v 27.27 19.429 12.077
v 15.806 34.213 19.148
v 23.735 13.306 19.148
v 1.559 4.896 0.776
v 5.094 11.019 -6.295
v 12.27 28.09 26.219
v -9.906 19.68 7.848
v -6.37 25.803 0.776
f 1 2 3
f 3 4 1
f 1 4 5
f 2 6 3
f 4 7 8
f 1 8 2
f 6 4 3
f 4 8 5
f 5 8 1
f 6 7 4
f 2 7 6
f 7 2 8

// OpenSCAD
/** Expands or shrinks value to required amount of dimensions. Can be used to convert:
    
    1. scalar to vector of dimension `nd` (v must be scalar, e.g. non-list)
    2. vector to `nd` dimension - useful for converting 2d to 3d point, or vice-versa
    3. points in vector `v` to `nd` dimensions - useful for polygon processing (to convert 3d points to 2d or vice versa)
        
    - `v` value to convert (scalar, list of scalars, or list of points - list of lists (in terms of openscad))
    - `nd` can be a number of dimensions or list with default values for additional dimensions, it length specifies target count of dimensions
    
*/
function bl_nd(v, nd) = let(
    count = is_list(nd) ? len(nd) : nd
) is_list(v) ? let(
    default = is_list(nd) ? nd : bl_nd(0, count)
) is_list(v[0])
    ? [ for (p = v) bl_nd(p, default) ]
    : [ for (i = [0 : count-1]) i < len(v) ? v[i] : default[i] ]
: [ for (i = [0 : count-1]) v ];

function bl_repeat(v, n) = [ for (i = [0:n-1]) v ];

function bl_2d(v) = bl_nd(v,2);
function bl_3d(v) = bl_nd(v,3);


/** Returns property value from list of pairs where left is a string key and right is value */
function bl_get(props, key, optional = false) = let(v = search([key], props)) is_num(v[0]) ? props[v[0]][1] : assert(optional, concat("No property found by key ", key)) undef;


function bl_set_default(props, key, value) = let(v = search([key], props)) is_num(v[0]) ? props : is_list(props) ? concat(props, [key, value]) : [[key,value]];

/** Returns first parameter if not undef, otherwise returns second paramater */
function bl_def(v, v_def) = v != undef ? v : v_def;

/** Multiplies vectors elementwise (hadamard product) */
function bl_mul(a, b) = is_list(a) 
    ? is_list(b) ? [ for (i = [0:max(len(a),len(b))-1]) bl_def(a[i], 1) * bl_def(b[i], 1) ] : [ for (v = a) v * b ] 
    : is_list(b) ? [ for (v = b) v * a ] : a * b;


/** Computes factorial */
function bl_fac(n) = n <= 1 ? 1 : n * bl_fac(n - 1);

/** Computes sum of all elements in array */
function bl_sum(a, i = 0) = i >= len(a) ? 0 : a[i] + bl_sum(a, i + 1);

/** Checks whether each element of v is zero or not (zero vector with zero norm) */
function bl_zero(v, i = 0) = i >= len(v) ? true: v[i] == 0 && bl_zero(v, i + 1);

/** Computes squares vector norm */
function bl_norm_sq(v) = bl_sum([ for (e = v) e * e ]);

/** Computes unit vector */
function bl_unit(v) = v / norm(v);

function bl_unit_identity(v, i) = bl_zero(v) ? [ for (j = [0:len(v)-1]) j == i ? 1 : 0 ] : bl_unit(v);

/** Extracts elements from `l` to `r`, not including `r` */
function bl_sub(a, l, r = undef) = let (
    ol = max(0, l < 0 ? len(a) + l : l), 
    or = max(ol, min(len(a), r == undef ? len(a) : r < 0 ? len(a) + r : r))
) [ for (i = [ol: or - 1]) a[i] ];

/** Takes first `l` elements from `a` */
function bl_head(a,l) = bl_sub(a, 0, l);

/** Takes last `l` elements from `a` */
function bl_tail(a, l) = bl_sub(a, -l);

/** Takes first `l` elements from `a` then from `b` */
function bl_head_def(a,b,l) = let(k = min(l,len(a))) concat([for(i=[0:k-1]) a[i]], [for(i=[k:l-1]) b[i]]);

/** Reverses array */
function bl_reverse(a, do_reverse = true) = do_reverse ? [for (i = [len(a) - 1 : -1 : 0]) a[i]] : a;

/** Creates offsets array from matrix (or any 2 dim array) */
function bl_off(m, i = 0, sum = 0) = i > len(m) ? [] : concat([sum], bl_off(m, i + 1, sum + len(m[i])));

/** Flatten matrix to array */
function bl_flat(m) = [ for (k = m) for (n = k) n ];

/** Creates translation matrix */
function bl_move(vec, dims = 3) = let(a = bl_nd(vec, dims), l = len(vec)) [ for (i = [0:l]) [ for (j = [0:l]) i == j ? 1 : j == l ? vec[i] : 0 ] ];

/** Creates scale matrix. If vec is scalar - then creates uniform scale matrix */
function bl_scale(vec, dims = 3) = let(a = bl_nd(vec, dims), l = len(a)) [ for (i = [0:l]) [ for (j = [0:l]) i == j ? i == l ? 1 : a[i] : 0 ] ];

/** Creates 2d rotation matrix */
function bl_rot_2(angle) = [[cos(angle),-sin(angle),0],[sin(angle),cos(angle),0],[0,0,1]];

/** Creates rotation matrix around X axis */
function bl_rot_x(angle) = [[1,0,0,0],[0,cos(angle),-sin(angle),0],[0,sin(angle),cos(angle),0],[0,0,0,1]];

/** Creates rotation matrix around Y axis */
function bl_rot_y(angle) = [[cos(angle),0,sin(angle),0],[0,1,0,0],[-sin(angle),0,cos(angle),0],[0,0,0,1]];

/** Creates rotation matrix around Z axis */
function bl_rot_z(angle) = [[cos(angle),-sin(angle),0,0],[sin(angle),cos(angle),0,0],[0,0,1,0],[0,0,0,1]];

function bl_rot(xyz) = bl_rot_z(xyz[2]) * bl_rot_y(xyz[1]) * bl_rot_x(xyz[0]);

/** Creates axis-angle rotation matrix */
function bl_rot_a(axis, angle) = let(n = bl_unit(axis), s = sin(angle), c = cos(angle), ac = 1 - c) [
    [c + ac*n[0]*n[0], ac*n[0]*n[1] - s*n[2], ac*n[0]*n[2] + s*n[1], 0],
    [ac*n[1]*n[0] + s*n[2], c + ac*n[1]*n[1], ac*n[1]*n[2] - s*n[0], 0],
    [ac*n[2]*n[0] - s*n[1], ac*n[2]*n[1] + s*n[0], c + ac*n[2]*n[2], 0],
    [0,0,0,1]
];

/** Creates rotation matrix from quaternion */
function bl_rot_q(q) = let(x = q[1], y = q[2], z = q[3], w = q[0], xw = 2*x*w, yw = 2*y*w, zw = 2*z*w) [
    [1-2*y*y-2*z*z, 2*x*y - zw, 2*x*z + yw, 0],
    [2*x*y+zw, 1-2*x*x-2*z*z, 2*y*z - xw, 0],
    [2*x*z-yw, 2*y*z+xw, 1-2*x*x-2*y*y, 0],
    [0,0,0,1]
];

function bl_ort(v) = [-v[1],v[2],-v[0]];

/** Creates rotation matrix from plane normal */
function bl_rot_v(v) = let(
    up = [0,0,1],
    f = bl_unit(v),
    s = bl_unit_identity(cross(f, up), 0),
    u = bl_unit_identity(cross(s, f), 1)
)
    [
        [s[0],u[0],f[0],0],
        [s[1],u[1],f[1],0],
        [s[2],u[2],f[2],0],
        [0,0,0,1]
    ];

/** Creates identity matrix */
function bl_id(dim = 3) = [ for (i = [0:dim]) [ for (j = [0:dim]) i == j ? 1 : 0 ] ];

/** 
    Normalizes radius[]/diameter[] values to [x_radius, y_radius] array
 */
function bl_radius_cast(radius) = is_list(radius) ? len(radius) >= 2 ? radius : [radius[0], radius[0]] : [radius, radius];

/** 
    Normalizes [start, end] angle array, 
    if `a` is scalar or single element array then angles is [0, a], 
    otherwise first two elements are [start, end] angles
 */
function bl_angle_cast(angle) = is_list(angle) ? len(angle) >= 2 ? angle : [0, angle[0]] : [0, angle];

/** Approximation of ellipse perimeter (about 5% error) */
function bl_ellipse_perimeter(radius) = let(ra = bl_radius_cast(radius)) 
    2 * PI * ((ra[0] == ra[1]) ? ra[0] : sqrt((ra[0]*ra[0] + ra[1]*ra[1]) / 2));

/** 
    
    Computes number of points to draw arc. 
    Uses original OpenSCAD formula, but expands it to support ellipse arcs:
    
        int get_fragments_from_r(double r, double fn, double fs, double fa)
        {
             if (r < GRID_FINE) return 3;
             if (fn > 0.0) return (int)(fn >= 3 ? fn : 3);
             return (int)ceil(fmax(fmin(360.0 / fa, r*2*M_PI / fs), 5));
        }
    
 */
function bl_arc_steps(radius, angle) = let(aa = bl_angle_cast(angle)) $fn > 0 ? $fn : ceil(max(min(abs(aa[1] - aa[0]) / $fa, bl_ellipse_perimeter(radius) / $fs), 5));

/** Computes single arc point at given angle `a` */
function bl_arc_pt(radius, angle, position = [0,0]) = let(ra = bl_radius_cast(radius)) [cos(angle) * ra[0] + position[0], sin(angle) * ra[1] + position[1]];

/** Computes arc points using fixed amount of steps */
function bl_arc_loop(radius, angle, steps, position = [0,0], slice = [0,0]) =
    let(ra = bl_radius_cast(radius), aa = bl_angle_cast(angle)) ra[0] == 0 || ra[1] == 0 
        ? [ position ]
        : [ for(i = [slice[0] : steps + slice[1]]) bl_arc_pt(ra, aa[0] + i * (aa[1] - aa[0]) / steps, position) ];

/** Computes arc */
function bl_arc(radius, angle, position = [0,0], slice = [0,0]) = bl_arc_loop(radius, angle, bl_arc_steps(radius, angle), position, slice);

/** Generates NGON shape */
function bl_ngon_points(radius, sides = 3, position = [0,0]) = bl_arc_loop(radius, 360, sides, position);

/** Creates 2d rectangle shape with specified rounded corner radiuses (radius parameter can be list with 1, 2, 4 length)*/
module bl_ngon(radius, sides = 3, position = [0,0]) {
    polygon(bl_ngon_points(radius, sides, position));
}

/** Generates star shape */
function bl_star_points(radius, sides = 5, position = [0,0]) = let(ra = bl_radius_cast(radius), m = sides * 2) 
    [ for (i = [0:m-1]) let(r = i % 2 == 0 ? ra[0] : ra[1]) [ cos(i * 360 / m) * r, sin(i * 360 / m) * r ] + position ];
       
/** Generates star shape */
module bl_star(radius, sides = 5, position = [0,0]) {
    polygon(bl_star_points(radius, sides, position));
}
    
/** Creates 2d rectangle shape with specified rounded corner radiuses */
function bl_square_points(dim, radius = 0, center = false) = let(
    left = center ? -dim[0]/2 : 0,
    bottom = center ? -dim[1]/2 : 0,
    right = center ? dim[0]/2 : dim[0],
    top = center ? dim[1]/ 2 : dim[1],
    rv = is_list(radius)
        ? len(radius) >= 4 ? radius : len(radius) >= 2 
            ? [radius[0], radius[0], radius[1], radius[1]] 
            : [radius[0], radius[0], radius[0], radius[0]]
        : [radius, radius, radius, radius]
) concat(
    bl_arc(radius = rv[0], angle = [0, 90], position = [right - rv[0], top - rv[0]]),
    bl_arc(radius = rv[1], angle = [90, 180], position = [left + rv[1], top - rv[1]]),
    bl_arc(radius = rv[2], angle = [180, 270], position = [left + rv[2], bottom + rv[2]]),
    bl_arc(radius = rv[3], angle = [270, 360], position = [right - rv[3], bottom + rv[3]])
);
    
/** Creates 2d rectangle shape with specified rounded corner radiuses (radius parameter can be list with 1, 2, 4 length)*/
module bl_square(dim, radius = 0, center = false) {
    polygon(bl_square_points(dim, radius, center));
}
    
/** Generates array of triangles required to connect two profiles */
function bl_faces(a_off, a_len, b_off, b_len) = a_len > b_len
    ? bl_faces_minmax(b_off, b_len, a_off, a_len, false)
    : bl_faces_minmax(a_off, a_len, b_off, b_len, true);

/** Generates surface */
function bl_surf(off, l, order = false) = l > 2 ? [bl_reverse([for (i = [0:l-1]) off + (i % l)], order)] : [];

function bl_faces_minmax(min_off, min_len, max_off, max_len, order = false) = let(k = floor(max_len / min_len)) concat(
    [ for (i = [0:max_len-1]) bl_reverse([
            max_off + i % max_len, 
            min_off + floor(i / k) % min_len, 
            max_off + (i + 1) % max_len
        ], order)
    ],
    min_len > 1 ? [ for (i = [0:min_len-1]) bl_reverse([
            min_off + i % min_len,
            max_off + floor((i + 1) * k) % max_len,
            min_off + (i + 1) % min_len
        ], !order)
    ] : []
);

/** Skins specified profiles forming 3d shape */
module bl_skin(profiles, loop = false) {
    
    edges = bl_flat(profiles);
    offsets = bl_off(profiles);
    
    faces = concat([ for (i = [0:len(profiles)-2]) for (f = bl_faces(
        offsets[i], offsets[i + 1] - offsets[i],
        offsets[i + 1], offsets[i + 2] - offsets[i + 1])) f ],
        loop ? [] : concat(
            bl_surf(offsets[0], offsets[1] - offsets[0]), 
            bl_surf(offsets[len(offsets)-2],offsets[len(offsets)-1] - offsets[len(offsets)-2], true)
        )
    );//, make_face(profiles[-1])];
    polyhedron(edges, faces);
    
}


function bl_bezier_combination(i, n) = bl_fac(n) / (bl_fac(i) * bl_fac(n - i));
function bl_bezier_polynome(i, n, t) = bl_bezier_combination(i, n) * pow(t, i) * pow(1 - t, n - i);
function bl_bezier_component(i, n, t, p) = let (b = bl_bezier_polynome(i, n, t)) [ for (c = p) c * b ];
function bl_bezier_steps() = $fn > 0 ? $fn : 12;
function bl_bezier_point(points, t, sum, i = 0) = let(n = len(points) - 1) 
    i > n ? sum : bl_bezier_point(points, t, bl_bezier_component(i, n, t, points[i]) + sum, i + 1);
function bl_bezier(points, last = true) = len(points) <= 2 ? points :
    let(segments = bl_bezier_steps()) [ for (i = [0 : last ? segments : segments - 1]) bl_bezier_point(points, i / segments, bl_nd(0, len(points[0]))) ];
    
module bl_line_3(p1, p2, d = 1) {
    v = p2 - p1;
    m = bl_rot_v(v);
    translate(p1) {
        multmatrix(m) {
            linear_extrude(norm(v)) {
                children();
            }
        }
    }
}
   
module bl_lines_3(points, d, loop = false) {
    for (i = [0:len(points)-2]) 
        bl_line_3(points[i], points[i+1], d) {
            children();
        }
    if (loop) {
        bl_line_3(points[len(points)-1], points[0], d) {
            children();
        }
    }
}

module bl_line_2(p1, p2, d) {   
    vec = p2 - p1;
    a = atan2(vec[1], vec[0]);
    
    l = [cos(a - 90) * d / 2, sin(a - 90) * d / 2];
    r = [cos(a + 90) * d / 2, sin(a + 90) * d / 2];
    
    polygon([
        p1 + r,
        p1 + l,
        p2 + l,
        p2 + r
    ]);
}

module bl_lines(points, d) {
    for (i = [0:len(points)-1]) 
        bl_line_2(points[i], points[(i+1) % len(points)], d);
}

module bl_debug_point(pt, f, d) {
    translate([pt[0],pt[1],0]) 
        % color([f, (1 - f), 0]) circle(d = d);
}

module bl_debug_line(p1, p2, f, d) {
    % color([f, (1 - f), 0]) bl_line_2(p1, p2, d);
}

module bl_debug(points, d = 2) {
    n = len(points);
    for (i = [0:n-2]) {
        f = i / (n - 1);
        bl_debug_point(points[i], i / (n - 1), d);
        bl_debug_line(points[i], points[i + 1], f, d / 2);
    }
    bl_debug_point(points[n-1], 1, d);
}
 
function bl_offset_line(l, off) = let(v = l[1] - l[0], ov = bl_unit([v[1], -v[0]]) * off) [ l[0] + ov, l[1] + ov ];

function bl_line_intersection(lines) = let(
    l1 = lines[0], 
    l2 = lines[1], 
    v1 = l1[0] - l1[1],
    v2 = l2[0] - l2[1],
    q1 = l1[0].x*l1[1].y - l1[0].y*l1[1].x,
    q2 = l2[0].x*l2[1].y - l2[0].y*l2[1].x,
    d = v1.x*v2.y - v1.y*v2.x
) abs(d) < 0.0001 ? undef : [ 
(q1*v2.x - v1.x*q2) / d, 
(q1*v2.y - v1.y*q2) / d
];

function bl_offset_poly(poly, off) = let(n = len(poly)) [ for (i = [0:n-1]) let(
    p1 = poly[i > 0 ? i - 1 : n - 1],
    p2 = poly[i],
    p3 = poly[(i + 1) % n],
    l1 = bl_offset_line([p1, p2], off),
    l2 = bl_offset_line([p2, p3], off),
    pi = bl_line_intersection([l1, l2]),
    pt = pi == undef ? l1[1] : pi
) pt ];

module bl_quad_mirror(dim, offsets, center=false, move=true) {
    d = bl_3d(dim);
    o = is_list(offsets) ? bl_3d(offsets) : [ for (i=[0:offsets-1]) bl_3d(0) ];
    
    for ($index = [0:len(o)-1]) {
        $offset = o[$index];
        translate(center ? [0,0,0] : d/2)
        mirror([0,0,floor($index / 4) % 2])
        mirror([0,floor($index / 2) % 2,0])
        mirror([$index % 2,0,0])
        translate(-d/2 + (move ? $offset : bl_3d(0)))
        children();
    }
}

module bl_ring(d, t) {
    difference() {
        circle(d = d + t*2);
        circle(d = d);
    }
}

module bl_hull_circle(d, l, center = false) {
    translate(center ? [0,0] : [d/2,d/2])
    hull() {
        circle(d = d);
        translate([l-d,0])
        circle(d = d);
    }
}

module bl_hull_ring(d, t, l) {
    difference() {
        bl_hull_circle(d+t*2, l);
        bl_hull_circle(d, l);
    }
}

module bl_half_circle_square(d, l=-1) {
    sl = l < 0 ? d/2 : l - d/2;
    intersection() {
        circle(d = d);
        translate([-d/2,0])
        square([d, d/2]);
    }
    translate([-d/2,-sl])
        square([d, sl]);
}

module bl_grid(counts, dim) {
    c = bl_nd(counts,[1,1,1]);
    d = bl_nd(dim,[0,0,0]);
    for (z = [0:c[2]-1]) {
        for (y = [0:c[1]-1]) {
            for (x = [0:c[0]-1]) {
                translate([x*dim[0], y*dim[1],z*dim[0]])
                    children();
            }
        }
    }
}

echo(bl_move([3,3,3]) * bl_rot_x(90));

#multmatrix(
    bl_rot([30,45,60]) *
    bl_move([3,3,3])
)
cube([10,20,30]);

rotate([30,45,60])
translate([3,3,3])
cube([10,20,30]);
